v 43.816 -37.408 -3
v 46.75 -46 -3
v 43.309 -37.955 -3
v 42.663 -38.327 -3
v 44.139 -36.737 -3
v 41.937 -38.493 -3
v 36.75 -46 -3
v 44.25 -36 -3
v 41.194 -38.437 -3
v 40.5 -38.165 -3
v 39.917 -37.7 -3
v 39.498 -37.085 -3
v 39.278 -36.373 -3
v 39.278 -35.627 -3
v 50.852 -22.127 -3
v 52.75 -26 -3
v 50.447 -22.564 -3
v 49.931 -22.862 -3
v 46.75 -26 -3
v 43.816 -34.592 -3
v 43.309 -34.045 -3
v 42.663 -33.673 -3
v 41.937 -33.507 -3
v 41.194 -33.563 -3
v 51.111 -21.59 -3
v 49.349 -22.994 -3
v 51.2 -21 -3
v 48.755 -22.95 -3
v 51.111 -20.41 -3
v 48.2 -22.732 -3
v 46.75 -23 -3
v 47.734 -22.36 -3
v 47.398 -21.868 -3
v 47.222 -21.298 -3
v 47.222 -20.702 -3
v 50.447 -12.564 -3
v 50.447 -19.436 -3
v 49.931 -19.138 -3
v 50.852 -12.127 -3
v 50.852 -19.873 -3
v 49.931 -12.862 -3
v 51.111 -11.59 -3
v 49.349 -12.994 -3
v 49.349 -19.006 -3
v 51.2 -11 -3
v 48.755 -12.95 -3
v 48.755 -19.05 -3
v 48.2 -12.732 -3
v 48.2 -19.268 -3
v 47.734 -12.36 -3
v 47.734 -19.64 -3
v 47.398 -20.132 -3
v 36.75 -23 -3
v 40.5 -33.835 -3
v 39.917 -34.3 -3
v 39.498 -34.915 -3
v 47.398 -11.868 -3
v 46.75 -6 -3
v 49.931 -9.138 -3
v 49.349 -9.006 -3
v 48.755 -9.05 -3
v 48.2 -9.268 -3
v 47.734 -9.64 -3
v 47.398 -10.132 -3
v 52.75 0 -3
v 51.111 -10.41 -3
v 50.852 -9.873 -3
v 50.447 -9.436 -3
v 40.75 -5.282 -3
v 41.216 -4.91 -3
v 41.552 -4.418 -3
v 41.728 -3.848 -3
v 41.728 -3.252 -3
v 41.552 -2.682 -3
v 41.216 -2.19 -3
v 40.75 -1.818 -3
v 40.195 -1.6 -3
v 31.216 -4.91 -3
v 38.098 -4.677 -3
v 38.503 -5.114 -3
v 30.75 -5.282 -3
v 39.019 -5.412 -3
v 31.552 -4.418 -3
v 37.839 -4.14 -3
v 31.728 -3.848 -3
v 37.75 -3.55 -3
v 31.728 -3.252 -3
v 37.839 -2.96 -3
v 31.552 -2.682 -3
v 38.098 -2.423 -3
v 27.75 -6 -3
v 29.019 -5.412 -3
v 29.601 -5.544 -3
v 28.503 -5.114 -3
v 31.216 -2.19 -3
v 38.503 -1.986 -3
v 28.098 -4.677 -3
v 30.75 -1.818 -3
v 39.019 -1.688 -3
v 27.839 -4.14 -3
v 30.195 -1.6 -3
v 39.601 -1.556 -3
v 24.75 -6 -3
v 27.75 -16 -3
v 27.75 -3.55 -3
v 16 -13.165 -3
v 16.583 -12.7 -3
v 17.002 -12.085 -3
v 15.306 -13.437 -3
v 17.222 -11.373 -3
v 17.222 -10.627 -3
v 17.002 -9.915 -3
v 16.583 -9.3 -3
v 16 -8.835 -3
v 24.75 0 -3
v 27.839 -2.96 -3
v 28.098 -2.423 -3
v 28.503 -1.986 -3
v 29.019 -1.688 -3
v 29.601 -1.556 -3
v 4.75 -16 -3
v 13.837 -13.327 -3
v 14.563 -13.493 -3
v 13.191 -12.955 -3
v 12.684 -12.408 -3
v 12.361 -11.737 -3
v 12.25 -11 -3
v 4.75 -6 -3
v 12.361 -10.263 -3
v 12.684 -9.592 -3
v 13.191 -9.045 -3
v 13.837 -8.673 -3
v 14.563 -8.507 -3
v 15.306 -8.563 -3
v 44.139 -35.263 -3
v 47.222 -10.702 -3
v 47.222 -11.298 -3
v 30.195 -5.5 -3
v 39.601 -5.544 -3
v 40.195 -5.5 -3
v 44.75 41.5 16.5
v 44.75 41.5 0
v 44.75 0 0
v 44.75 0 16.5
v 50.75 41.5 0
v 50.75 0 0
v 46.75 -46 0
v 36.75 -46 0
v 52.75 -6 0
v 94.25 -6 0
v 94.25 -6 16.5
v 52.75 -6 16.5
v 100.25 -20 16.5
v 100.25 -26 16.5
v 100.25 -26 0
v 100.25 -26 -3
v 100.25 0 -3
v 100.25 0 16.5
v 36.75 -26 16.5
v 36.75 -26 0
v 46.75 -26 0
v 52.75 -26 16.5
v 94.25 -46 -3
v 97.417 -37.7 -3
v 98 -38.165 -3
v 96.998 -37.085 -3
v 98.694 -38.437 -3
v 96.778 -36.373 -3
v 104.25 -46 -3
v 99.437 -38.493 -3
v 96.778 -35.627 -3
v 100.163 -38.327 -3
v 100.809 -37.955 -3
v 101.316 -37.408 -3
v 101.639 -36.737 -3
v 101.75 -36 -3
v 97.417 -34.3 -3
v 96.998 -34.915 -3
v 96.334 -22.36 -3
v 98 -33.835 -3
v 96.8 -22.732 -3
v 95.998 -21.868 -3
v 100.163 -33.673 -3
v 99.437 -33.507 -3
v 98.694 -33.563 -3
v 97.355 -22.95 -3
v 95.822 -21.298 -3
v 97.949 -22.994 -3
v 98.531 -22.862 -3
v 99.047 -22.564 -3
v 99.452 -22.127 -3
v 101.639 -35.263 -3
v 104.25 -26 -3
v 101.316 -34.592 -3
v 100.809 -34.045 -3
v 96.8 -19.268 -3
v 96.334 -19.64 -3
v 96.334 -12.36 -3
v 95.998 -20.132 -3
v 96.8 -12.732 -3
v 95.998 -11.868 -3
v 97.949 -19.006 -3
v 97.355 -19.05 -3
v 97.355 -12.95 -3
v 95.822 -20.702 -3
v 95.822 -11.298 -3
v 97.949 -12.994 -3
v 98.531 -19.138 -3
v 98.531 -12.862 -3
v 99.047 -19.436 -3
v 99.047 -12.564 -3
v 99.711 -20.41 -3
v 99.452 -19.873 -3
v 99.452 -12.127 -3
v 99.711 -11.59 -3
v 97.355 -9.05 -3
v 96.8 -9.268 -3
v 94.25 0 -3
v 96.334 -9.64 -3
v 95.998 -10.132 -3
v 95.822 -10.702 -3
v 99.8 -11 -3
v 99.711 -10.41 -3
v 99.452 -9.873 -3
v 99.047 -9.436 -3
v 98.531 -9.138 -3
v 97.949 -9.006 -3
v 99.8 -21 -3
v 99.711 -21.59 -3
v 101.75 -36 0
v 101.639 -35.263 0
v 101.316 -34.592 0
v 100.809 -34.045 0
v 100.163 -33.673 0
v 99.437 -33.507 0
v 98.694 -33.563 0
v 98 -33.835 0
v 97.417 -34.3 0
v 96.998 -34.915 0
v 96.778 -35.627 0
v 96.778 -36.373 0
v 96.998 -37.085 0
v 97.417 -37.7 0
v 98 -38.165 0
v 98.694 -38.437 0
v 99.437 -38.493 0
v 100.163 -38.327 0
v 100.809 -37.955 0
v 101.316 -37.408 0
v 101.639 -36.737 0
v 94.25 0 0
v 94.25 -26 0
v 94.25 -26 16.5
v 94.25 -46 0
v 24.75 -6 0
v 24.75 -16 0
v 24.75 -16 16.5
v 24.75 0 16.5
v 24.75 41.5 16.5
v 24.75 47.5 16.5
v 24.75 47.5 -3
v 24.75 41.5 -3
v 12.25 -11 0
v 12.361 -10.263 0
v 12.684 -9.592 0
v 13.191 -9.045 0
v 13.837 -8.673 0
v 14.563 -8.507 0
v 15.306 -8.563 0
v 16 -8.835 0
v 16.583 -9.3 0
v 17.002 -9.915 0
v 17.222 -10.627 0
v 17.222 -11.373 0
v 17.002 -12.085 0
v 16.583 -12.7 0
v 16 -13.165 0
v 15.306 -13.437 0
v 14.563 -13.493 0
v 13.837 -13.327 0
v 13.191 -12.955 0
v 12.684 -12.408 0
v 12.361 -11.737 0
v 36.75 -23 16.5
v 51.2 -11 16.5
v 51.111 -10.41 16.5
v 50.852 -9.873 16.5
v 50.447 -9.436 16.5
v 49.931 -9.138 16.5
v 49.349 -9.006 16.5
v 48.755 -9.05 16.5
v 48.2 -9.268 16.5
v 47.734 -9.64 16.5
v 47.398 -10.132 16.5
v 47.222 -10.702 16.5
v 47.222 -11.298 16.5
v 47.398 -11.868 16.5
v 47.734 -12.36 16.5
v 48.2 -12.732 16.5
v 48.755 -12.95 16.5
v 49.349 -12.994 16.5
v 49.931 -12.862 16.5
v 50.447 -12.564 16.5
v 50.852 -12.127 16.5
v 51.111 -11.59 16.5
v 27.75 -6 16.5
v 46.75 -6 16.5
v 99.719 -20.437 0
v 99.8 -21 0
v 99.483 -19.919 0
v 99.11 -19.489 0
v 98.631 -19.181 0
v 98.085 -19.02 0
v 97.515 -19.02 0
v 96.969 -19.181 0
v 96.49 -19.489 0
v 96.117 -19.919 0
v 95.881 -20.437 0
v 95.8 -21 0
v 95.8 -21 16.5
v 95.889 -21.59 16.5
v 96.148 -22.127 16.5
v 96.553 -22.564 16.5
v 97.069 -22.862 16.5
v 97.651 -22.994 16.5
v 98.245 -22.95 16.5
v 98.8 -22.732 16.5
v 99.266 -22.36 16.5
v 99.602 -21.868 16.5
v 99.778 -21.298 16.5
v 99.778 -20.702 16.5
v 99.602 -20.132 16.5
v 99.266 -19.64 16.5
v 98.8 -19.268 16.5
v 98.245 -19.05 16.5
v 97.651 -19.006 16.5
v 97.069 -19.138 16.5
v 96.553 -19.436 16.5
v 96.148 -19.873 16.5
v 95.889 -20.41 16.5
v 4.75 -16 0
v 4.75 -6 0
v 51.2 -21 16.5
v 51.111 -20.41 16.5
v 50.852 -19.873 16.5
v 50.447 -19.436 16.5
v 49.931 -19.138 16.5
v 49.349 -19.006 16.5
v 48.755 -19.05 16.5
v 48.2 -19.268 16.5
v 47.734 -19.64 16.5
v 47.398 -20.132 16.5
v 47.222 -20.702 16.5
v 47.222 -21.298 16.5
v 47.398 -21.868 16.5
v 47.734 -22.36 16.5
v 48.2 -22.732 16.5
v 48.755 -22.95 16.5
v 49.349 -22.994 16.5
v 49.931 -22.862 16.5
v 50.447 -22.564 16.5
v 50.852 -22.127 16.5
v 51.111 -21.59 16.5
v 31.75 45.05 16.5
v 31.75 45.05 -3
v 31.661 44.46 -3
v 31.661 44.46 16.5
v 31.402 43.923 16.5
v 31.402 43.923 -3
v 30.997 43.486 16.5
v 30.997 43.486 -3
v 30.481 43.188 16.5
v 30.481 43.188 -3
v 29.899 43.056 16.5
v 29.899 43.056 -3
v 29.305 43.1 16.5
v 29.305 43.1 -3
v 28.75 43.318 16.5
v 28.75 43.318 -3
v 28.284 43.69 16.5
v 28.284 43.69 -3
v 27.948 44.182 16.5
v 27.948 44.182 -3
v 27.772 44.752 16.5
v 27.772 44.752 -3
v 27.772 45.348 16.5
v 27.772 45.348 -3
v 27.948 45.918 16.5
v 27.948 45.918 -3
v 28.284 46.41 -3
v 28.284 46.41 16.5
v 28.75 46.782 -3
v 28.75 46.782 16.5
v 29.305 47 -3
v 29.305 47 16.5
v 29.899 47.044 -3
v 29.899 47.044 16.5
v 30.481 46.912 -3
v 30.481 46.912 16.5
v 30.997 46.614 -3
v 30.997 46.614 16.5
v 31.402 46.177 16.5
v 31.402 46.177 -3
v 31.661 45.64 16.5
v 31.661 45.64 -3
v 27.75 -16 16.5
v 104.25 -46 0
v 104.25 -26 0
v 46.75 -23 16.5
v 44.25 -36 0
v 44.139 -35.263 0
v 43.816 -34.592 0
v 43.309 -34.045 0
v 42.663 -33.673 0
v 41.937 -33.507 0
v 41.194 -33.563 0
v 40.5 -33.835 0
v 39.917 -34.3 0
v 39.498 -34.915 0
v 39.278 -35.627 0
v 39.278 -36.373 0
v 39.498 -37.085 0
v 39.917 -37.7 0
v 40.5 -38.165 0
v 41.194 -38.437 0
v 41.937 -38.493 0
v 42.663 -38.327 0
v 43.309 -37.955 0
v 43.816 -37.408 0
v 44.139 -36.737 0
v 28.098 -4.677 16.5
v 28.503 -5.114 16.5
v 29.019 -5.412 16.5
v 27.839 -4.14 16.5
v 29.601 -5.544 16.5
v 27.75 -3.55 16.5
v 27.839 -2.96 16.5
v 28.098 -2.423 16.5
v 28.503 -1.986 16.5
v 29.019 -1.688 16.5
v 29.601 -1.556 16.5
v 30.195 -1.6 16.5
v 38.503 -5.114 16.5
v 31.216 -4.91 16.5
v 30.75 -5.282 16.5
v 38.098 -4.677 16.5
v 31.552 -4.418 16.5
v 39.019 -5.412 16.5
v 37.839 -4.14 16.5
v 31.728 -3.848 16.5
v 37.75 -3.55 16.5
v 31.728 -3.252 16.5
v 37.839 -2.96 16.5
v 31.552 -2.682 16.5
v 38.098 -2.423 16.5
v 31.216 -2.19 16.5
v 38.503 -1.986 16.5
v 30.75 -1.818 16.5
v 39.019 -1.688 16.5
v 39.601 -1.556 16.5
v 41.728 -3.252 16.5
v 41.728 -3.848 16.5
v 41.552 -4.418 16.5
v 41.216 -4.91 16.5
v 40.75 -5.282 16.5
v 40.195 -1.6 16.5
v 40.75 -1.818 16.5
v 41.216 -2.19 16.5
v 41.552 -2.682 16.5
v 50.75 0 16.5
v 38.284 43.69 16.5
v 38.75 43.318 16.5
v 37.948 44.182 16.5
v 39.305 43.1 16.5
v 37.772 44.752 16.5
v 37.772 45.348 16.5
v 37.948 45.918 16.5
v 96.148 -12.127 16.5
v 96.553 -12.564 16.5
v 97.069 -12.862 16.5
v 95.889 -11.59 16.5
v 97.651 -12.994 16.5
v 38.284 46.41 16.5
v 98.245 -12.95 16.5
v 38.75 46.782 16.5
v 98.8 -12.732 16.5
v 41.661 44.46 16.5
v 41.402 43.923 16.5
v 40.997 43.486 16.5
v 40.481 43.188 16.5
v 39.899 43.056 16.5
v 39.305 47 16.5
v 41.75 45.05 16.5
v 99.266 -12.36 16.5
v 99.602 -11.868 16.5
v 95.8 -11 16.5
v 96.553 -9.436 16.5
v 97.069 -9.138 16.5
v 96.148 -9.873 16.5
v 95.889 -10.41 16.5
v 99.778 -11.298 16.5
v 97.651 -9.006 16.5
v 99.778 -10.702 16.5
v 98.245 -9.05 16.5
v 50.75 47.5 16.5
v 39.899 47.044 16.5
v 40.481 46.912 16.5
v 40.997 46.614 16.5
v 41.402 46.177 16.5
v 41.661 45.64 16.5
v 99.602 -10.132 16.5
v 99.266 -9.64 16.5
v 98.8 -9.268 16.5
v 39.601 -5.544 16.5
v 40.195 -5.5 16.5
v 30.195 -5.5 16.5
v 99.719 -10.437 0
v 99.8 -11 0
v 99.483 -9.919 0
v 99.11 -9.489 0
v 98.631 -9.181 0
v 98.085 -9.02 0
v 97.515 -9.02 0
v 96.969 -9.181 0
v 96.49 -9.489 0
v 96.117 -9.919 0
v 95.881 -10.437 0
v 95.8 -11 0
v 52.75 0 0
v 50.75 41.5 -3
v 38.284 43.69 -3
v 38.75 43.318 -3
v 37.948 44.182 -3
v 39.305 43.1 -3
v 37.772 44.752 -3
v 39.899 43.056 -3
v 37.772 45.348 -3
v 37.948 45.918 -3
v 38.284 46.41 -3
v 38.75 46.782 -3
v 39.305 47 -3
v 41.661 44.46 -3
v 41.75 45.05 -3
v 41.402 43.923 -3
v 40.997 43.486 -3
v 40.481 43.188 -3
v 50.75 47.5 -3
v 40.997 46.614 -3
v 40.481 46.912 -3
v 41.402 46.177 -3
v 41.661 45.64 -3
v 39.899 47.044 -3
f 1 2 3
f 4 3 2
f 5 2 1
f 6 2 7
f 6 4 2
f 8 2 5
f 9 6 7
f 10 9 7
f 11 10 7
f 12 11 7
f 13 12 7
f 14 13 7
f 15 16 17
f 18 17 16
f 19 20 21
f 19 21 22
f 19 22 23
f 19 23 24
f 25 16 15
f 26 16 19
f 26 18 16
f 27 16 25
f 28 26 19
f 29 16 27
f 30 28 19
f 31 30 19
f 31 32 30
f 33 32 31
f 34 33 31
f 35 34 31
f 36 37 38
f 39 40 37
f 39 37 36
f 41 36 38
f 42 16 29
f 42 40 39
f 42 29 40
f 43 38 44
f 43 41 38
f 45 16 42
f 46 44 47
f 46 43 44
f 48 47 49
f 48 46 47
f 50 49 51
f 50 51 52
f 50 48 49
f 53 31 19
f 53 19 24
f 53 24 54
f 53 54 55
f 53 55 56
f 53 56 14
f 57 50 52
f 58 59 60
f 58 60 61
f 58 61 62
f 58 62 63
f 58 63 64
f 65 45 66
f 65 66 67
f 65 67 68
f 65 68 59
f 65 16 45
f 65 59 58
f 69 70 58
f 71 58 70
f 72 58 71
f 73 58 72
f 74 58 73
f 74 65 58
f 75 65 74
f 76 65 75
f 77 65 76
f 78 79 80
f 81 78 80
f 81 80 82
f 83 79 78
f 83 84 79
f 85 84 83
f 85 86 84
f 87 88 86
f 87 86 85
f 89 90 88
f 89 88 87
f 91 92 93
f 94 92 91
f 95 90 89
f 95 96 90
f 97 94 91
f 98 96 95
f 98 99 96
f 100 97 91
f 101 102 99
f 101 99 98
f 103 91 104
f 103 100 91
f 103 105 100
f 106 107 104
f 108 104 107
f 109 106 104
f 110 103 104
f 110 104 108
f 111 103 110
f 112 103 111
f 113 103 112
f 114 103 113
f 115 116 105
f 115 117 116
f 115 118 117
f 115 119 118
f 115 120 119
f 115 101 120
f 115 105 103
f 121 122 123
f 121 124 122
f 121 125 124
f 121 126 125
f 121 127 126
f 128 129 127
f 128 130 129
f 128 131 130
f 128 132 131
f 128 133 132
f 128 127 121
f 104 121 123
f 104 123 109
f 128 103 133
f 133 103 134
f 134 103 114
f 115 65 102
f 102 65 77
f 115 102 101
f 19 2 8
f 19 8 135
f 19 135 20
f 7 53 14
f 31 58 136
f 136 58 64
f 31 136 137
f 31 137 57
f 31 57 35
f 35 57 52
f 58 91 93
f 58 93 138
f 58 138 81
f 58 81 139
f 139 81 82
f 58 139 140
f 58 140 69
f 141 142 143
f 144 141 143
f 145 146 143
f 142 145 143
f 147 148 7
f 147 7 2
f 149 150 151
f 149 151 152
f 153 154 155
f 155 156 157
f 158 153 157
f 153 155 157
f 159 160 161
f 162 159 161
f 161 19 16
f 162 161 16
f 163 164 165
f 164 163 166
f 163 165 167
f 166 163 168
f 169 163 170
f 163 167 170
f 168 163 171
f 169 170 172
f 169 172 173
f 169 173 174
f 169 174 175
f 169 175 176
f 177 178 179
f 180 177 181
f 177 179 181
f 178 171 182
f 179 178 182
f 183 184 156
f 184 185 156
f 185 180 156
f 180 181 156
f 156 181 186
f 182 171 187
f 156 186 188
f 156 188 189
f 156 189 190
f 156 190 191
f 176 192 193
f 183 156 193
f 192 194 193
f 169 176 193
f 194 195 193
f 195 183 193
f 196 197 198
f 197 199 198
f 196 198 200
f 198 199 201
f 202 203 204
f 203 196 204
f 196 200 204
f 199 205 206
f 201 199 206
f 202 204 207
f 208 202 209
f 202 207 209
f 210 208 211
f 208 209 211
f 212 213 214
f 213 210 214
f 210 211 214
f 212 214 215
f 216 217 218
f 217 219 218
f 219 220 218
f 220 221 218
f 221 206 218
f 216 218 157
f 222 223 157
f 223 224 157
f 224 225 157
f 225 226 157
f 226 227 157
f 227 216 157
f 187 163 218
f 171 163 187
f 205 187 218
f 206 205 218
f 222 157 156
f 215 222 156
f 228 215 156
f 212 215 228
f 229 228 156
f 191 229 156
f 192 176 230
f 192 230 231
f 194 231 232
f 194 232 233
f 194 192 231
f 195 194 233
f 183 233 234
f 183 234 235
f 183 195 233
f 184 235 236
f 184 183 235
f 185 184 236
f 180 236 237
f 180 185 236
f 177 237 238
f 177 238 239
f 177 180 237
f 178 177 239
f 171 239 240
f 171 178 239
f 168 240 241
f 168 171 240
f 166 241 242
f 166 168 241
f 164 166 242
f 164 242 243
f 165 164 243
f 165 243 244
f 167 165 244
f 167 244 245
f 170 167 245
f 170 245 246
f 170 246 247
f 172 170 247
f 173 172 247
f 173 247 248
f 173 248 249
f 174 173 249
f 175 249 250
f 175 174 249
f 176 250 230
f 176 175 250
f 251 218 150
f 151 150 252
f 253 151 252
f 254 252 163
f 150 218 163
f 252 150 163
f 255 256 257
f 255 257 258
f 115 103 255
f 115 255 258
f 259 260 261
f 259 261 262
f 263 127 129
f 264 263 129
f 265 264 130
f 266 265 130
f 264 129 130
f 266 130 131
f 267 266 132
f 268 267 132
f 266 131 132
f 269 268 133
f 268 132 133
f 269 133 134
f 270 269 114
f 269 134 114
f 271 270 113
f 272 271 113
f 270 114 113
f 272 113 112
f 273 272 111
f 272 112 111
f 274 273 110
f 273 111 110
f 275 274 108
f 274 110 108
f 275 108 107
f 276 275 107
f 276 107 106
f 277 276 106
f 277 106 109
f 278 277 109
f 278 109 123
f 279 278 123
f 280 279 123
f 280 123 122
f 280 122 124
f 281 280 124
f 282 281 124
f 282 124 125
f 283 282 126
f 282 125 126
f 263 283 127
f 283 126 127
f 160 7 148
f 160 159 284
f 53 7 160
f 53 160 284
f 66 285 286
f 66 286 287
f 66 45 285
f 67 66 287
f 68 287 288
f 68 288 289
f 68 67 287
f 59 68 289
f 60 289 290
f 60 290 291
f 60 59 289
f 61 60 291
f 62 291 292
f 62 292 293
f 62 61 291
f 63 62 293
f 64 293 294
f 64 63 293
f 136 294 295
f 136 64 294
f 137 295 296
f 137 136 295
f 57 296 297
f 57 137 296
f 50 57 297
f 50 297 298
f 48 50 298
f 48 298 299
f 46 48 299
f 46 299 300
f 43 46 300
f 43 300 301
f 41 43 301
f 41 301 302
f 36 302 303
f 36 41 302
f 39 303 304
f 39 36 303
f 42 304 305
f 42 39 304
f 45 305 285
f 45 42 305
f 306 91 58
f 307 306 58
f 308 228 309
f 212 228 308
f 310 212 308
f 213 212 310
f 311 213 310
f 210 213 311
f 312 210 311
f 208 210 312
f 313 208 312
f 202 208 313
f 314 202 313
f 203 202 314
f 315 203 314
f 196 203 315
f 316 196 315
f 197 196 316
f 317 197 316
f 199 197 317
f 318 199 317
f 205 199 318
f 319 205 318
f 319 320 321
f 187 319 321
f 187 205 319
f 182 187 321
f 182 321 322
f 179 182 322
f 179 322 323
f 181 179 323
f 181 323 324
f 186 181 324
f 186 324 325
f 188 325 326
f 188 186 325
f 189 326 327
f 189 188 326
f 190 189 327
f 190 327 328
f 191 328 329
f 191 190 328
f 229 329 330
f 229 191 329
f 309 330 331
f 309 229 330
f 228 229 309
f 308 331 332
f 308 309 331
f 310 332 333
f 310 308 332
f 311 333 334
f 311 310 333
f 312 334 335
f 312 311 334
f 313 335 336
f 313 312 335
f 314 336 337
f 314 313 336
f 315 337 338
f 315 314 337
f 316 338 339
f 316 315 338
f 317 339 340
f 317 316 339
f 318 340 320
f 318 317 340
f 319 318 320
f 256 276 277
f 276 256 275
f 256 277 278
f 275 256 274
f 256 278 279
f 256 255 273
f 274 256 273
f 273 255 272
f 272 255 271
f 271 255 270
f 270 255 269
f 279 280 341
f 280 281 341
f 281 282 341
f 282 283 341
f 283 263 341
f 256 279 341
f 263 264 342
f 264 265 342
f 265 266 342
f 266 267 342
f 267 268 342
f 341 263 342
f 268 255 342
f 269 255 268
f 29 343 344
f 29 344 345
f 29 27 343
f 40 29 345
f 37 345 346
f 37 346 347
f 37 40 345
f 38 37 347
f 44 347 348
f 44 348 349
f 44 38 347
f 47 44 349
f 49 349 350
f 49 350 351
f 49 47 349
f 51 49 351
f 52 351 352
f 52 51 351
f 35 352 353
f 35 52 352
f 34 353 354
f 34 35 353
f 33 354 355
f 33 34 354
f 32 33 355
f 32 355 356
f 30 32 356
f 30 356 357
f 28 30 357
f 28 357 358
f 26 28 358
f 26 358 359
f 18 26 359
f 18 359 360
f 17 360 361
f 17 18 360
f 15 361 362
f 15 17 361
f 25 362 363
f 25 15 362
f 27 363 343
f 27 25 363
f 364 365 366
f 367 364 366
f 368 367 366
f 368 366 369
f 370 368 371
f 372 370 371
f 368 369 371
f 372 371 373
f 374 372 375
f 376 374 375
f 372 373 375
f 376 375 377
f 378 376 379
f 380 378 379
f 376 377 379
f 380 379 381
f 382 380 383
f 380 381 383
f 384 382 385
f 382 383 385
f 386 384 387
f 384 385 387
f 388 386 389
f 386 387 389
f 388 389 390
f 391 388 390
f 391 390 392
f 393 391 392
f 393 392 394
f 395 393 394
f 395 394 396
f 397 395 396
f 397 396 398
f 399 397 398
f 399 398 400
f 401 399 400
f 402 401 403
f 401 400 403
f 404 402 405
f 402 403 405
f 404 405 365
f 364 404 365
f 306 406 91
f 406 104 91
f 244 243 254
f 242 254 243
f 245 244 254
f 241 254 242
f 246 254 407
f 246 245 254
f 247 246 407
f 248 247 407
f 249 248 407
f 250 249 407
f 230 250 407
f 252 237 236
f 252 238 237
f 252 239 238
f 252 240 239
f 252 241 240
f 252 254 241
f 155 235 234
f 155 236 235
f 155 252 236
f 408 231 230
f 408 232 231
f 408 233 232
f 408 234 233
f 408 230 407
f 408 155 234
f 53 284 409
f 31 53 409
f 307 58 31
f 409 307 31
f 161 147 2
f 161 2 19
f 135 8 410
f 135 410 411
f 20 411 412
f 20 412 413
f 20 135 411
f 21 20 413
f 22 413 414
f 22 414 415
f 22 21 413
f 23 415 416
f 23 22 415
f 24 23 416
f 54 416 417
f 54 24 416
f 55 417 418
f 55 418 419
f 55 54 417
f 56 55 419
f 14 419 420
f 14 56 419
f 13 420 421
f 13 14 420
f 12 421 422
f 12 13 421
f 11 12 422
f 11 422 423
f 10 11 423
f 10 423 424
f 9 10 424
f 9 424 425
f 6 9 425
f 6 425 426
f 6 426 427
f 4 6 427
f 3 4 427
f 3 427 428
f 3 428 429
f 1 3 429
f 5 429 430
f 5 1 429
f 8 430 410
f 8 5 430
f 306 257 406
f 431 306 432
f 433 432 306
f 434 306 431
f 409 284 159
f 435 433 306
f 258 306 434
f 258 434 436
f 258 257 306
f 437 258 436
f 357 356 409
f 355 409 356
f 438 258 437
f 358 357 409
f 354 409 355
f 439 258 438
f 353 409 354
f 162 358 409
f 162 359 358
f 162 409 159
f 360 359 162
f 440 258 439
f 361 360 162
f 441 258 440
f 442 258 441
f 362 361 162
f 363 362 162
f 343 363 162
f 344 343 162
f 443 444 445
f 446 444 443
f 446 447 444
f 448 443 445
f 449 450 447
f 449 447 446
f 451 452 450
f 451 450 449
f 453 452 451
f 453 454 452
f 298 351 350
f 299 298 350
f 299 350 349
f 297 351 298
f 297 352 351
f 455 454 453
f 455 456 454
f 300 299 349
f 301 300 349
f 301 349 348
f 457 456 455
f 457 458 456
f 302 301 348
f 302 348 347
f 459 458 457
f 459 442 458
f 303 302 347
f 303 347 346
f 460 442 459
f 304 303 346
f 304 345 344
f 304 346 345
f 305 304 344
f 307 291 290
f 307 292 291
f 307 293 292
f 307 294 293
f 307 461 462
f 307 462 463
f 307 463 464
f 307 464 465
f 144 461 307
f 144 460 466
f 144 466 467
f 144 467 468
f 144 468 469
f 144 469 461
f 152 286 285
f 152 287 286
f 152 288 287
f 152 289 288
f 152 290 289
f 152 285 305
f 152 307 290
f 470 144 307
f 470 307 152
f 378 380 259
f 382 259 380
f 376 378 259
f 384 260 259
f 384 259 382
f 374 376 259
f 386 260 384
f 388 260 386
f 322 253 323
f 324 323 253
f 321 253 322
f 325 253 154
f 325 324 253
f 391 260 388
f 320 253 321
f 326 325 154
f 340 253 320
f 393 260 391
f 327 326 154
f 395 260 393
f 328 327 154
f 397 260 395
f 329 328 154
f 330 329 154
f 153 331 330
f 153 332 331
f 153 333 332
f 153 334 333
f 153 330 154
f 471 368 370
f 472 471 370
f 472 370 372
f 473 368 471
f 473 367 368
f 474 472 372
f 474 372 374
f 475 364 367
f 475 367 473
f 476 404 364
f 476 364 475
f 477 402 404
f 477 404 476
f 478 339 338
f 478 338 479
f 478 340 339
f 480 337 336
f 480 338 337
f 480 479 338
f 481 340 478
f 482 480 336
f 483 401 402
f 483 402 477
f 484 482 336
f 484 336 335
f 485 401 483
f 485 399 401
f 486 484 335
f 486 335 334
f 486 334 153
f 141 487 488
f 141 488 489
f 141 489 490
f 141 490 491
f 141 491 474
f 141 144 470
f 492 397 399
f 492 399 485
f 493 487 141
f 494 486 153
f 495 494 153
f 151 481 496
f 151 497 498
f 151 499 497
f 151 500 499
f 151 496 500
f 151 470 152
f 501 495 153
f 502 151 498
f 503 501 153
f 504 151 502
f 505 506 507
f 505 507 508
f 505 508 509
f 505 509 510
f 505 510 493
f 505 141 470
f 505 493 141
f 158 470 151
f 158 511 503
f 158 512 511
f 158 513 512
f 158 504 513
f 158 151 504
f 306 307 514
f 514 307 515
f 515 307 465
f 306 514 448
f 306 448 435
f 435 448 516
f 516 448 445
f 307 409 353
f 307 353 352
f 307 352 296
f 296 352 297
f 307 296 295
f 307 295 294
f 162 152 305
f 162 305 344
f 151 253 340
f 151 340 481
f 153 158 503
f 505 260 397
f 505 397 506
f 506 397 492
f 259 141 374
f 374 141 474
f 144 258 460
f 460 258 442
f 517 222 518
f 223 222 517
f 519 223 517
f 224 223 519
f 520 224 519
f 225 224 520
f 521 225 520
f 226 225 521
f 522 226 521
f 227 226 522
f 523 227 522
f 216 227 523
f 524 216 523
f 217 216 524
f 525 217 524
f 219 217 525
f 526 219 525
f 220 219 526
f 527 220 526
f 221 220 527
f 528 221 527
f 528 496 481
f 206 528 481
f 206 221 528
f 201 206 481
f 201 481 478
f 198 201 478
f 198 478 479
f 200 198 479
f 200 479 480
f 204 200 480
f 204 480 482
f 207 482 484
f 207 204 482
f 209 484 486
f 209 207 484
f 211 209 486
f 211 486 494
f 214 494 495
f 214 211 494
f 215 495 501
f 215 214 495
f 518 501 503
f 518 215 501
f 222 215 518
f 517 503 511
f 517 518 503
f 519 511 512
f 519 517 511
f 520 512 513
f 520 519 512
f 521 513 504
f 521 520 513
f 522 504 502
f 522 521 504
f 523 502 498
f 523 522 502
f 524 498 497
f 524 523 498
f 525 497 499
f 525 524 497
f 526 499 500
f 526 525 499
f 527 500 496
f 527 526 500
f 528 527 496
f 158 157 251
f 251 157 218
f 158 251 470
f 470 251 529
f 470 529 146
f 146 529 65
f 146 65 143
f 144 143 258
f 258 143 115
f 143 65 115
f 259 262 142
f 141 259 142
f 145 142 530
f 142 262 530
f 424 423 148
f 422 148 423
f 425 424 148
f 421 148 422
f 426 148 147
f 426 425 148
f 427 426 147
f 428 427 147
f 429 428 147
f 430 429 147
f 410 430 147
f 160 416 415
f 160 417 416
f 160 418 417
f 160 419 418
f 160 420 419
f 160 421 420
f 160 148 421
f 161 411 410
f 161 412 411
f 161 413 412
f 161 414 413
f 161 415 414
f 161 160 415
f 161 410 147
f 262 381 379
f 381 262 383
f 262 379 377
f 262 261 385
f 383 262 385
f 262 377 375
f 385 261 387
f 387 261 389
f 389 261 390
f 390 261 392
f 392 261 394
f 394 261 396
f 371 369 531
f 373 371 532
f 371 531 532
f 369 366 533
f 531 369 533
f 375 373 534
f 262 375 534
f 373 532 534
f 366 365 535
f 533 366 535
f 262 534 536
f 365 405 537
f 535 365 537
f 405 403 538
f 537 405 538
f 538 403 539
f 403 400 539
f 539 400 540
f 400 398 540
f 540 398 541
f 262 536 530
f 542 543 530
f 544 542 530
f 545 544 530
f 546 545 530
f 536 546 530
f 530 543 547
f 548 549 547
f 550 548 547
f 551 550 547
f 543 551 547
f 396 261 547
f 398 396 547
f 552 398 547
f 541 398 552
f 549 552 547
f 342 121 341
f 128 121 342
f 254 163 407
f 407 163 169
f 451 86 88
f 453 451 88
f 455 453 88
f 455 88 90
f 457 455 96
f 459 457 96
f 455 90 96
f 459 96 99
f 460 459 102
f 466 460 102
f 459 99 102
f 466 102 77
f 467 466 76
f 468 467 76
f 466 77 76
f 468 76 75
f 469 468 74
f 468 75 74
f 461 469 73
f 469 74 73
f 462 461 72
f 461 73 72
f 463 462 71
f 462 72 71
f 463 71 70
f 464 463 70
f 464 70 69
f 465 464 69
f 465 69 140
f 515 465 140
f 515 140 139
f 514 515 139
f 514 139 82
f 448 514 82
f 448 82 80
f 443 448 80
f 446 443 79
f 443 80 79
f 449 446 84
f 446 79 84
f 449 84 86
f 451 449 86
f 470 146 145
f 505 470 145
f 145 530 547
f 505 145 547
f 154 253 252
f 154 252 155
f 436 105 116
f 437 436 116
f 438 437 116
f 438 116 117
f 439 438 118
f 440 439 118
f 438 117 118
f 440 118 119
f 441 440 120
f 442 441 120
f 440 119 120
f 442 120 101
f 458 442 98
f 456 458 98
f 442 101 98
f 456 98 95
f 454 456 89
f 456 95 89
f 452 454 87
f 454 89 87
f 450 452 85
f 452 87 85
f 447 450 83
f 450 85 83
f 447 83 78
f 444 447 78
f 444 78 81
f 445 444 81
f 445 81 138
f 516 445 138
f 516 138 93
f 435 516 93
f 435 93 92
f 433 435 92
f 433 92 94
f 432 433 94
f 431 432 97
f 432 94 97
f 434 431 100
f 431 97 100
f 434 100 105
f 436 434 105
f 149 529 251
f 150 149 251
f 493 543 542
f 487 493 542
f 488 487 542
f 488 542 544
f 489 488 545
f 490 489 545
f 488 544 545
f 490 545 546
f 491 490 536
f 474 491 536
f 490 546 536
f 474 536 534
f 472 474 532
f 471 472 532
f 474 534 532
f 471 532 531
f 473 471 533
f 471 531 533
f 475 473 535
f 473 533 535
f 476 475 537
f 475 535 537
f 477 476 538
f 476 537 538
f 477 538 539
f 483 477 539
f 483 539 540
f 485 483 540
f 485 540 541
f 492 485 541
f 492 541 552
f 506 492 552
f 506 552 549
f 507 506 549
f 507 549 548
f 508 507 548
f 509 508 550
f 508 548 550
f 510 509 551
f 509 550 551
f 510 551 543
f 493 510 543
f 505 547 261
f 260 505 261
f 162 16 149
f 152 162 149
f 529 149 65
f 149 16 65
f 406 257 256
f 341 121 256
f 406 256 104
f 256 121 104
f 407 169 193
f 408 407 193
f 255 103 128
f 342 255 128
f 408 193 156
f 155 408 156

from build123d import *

# Parameters (mm, degrees)
EXTRUDE_1_DEPTH     = 16.5
SKETCH_3_W          = 10
SKETCH_3_H          = 16.5
CUT_EXTRUDE_2_DEPTH = 3
SKETCH_4_W          = 11.896315449
SKETCH_4_H          = 29.084641161
CUT_EXTRUDE_3_DEPTH = 48.945933091
SKETCH_5_R          = 2
CUT_EXTRUDE_4_DEPTH = 48.945933091
SKETCH_6_W          = 10
SKETCH_6_H          = 23
EXTRUDE_2_DEPTH     = 3
SKETCH_7_R          = 2.5
CUT_EXTRUDE_5_DEPTH = 3
EXTRUDE_START       = 3
SKETCH_8_R          = 2
SKETCH_8_W          = 6
SKETCH_8_H          = 26
EXTRUDE_3_DEPTH     = 3
SKETCH_9_R          = 2.5
CUT_EXTRUDE_6_DEPTH = 3
SKETCH_10_W         = 74.694005649
SKETCH_10_H         = 52.095093629
CUT_EXTRUDE_7_DEPTH = 116.604119736
SKETCH_13_R         = 2
EXTRUDE_4_DEPTH     = 19.5
SKETCH_14_W         = 6
SKETCH_14_H         = 41.5
CUT_EXTRUDE_9_DEPTH = 3
SKETCH_15_W         = 23
SKETCH_15_H         = 10
SKETCH_15_R         = 2.5
EXTRUDE_5_DEPTH     = 3
SKETCH_16_W         = 3
SKETCH_16_H         = 10
EXTRUDE_6_DEPTH     = 16.5


with BuildPart() as part:
    # 草图1 → 凸台-拉伸1 (new body)
    with BuildSketch(Plane.XY):
        Polygon((0, 0), (26.75, 0), (26.75, -20), (36.75, -20), (36.75, -26), (20.75, -26), (20.75, -6), (0, -6), (-20.75, -6), (-20.75, -26), (-36.75, -26), (-36.75, -20), (-26.75, -20), (-26.75, 0), align=None)
    extrude(amount=EXTRUDE_1_DEPTH)

    # 草图3 → 切除-拉伸2 (cut)
    with BuildSketch(Plane(origin=(0, -20, 0), x_dir=(1, 0, 0), z_dir=(0, 1, 0))):
        with Locations((31.75, -8.25)):
            Rectangle(SKETCH_3_W, SKETCH_3_H)
    extrude(amount=-CUT_EXTRUDE_2_DEPTH, mode=Mode.SUBTRACT)

    # 草图4 → 切除-拉伸3 (cut, through all)
    with BuildSketch(Plane.XY.offset(16.5)):
        with Locations((-32.698157724, -14.542320581)):
            Rectangle(SKETCH_4_W, SKETCH_4_H)
    extrude(amount=-CUT_EXTRUDE_3_DEPTH, mode=Mode.SUBTRACT)

    # 草图5 → 切除-拉伸4 (cut, through all)
    with BuildSketch(Plane(origin=(0, 0, 0), x_dir=(-1, 0, 0), z_dir=(0, 0, -1))):
        with Locations((-24.3, -11)):
            Circle(SKETCH_5_R)
        with Locations((-24.3, -21)):
            Circle(SKETCH_5_R)
        with Locations(Location((24.3, -21, 0), (0, 0, 180))):
            Circle(SKETCH_5_R)
        with Locations(Location((24.3, -11, 0), (0, 0, 180))):
            Circle(SKETCH_5_R)
    extrude(amount=-CUT_EXTRUDE_4_DEPTH, mode=Mode.SUBTRACT)

    # 草图6 → 凸台-拉伸2 (add)
    with BuildSketch(Plane(origin=(0, 0, 0), x_dir=(-1, 0, 0), z_dir=(0, 0, -1))):
        with Locations((-31.75, -34.5)):
            Rectangle(SKETCH_6_W, SKETCH_6_H)
    extrude(amount=EXTRUDE_2_DEPTH)

    # 草图7 → 切除-拉伸5 (cut)
    with BuildSketch(Plane(origin=(0, 0, -3), x_dir=(-1, 0, 0), z_dir=(0, 0, -1))):
        with Locations((-31.75, -36)):
            Circle(SKETCH_7_R)
    extrude(amount=-CUT_EXTRUDE_5_DEPTH, mode=Mode.SUBTRACT)

    # 草图8 → 凸台-拉伸3 (add)
    # profile 1 of 2: a face of its own
    with BuildSketch(Plane(origin=(0, 0, 0), x_dir=(-1, 0, 0), z_dir=(0, 0, -1)).offset(EXTRUDE_START)):
        Polygon((26.75, 0), (20.75, 0), (20.75, -46), (26.75, -46), (30.75, -46), (30.75, -26), (26.75, -26), align=None)
        with Locations((24.3, -21)):
            Circle(SKETCH_8_R, mode=Mode.SUBTRACT)
        with Locations((24.3, -11)):
            Circle(SKETCH_8_R, mode=Mode.SUBTRACT)
    # profile 2 of 2: a face of its own
    with BuildSketch(Plane(origin=(0, 0, 0), x_dir=(-1, 0, 0), z_dir=(0, 0, -1)).offset(EXTRUDE_START)):
        with Locations((-23.75, -13)):
            Rectangle(SKETCH_8_W, SKETCH_8_H)
        with Locations((-24.3, -11)):
            Circle(SKETCH_8_R, mode=Mode.SUBTRACT)
        with Locations((-24.3, -21)):
            Circle(SKETCH_8_R, mode=Mode.SUBTRACT)
    extrude(amount=-EXTRUDE_3_DEPTH)

    # 草图9 → 切除-拉伸6 (cut)
    with BuildSketch(Plane(origin=(0, 0, -3), x_dir=(-1, 0, 0), z_dir=(0, 0, -1))):
        with Locations((25.75, -36)):
            Circle(SKETCH_9_R)
    extrude(amount=-CUT_EXTRUDE_6_DEPTH, mode=Mode.SUBTRACT)

    # 镜向1: part across plane


with BuildPart() as part_1:
    add(part.part)
    add(part.part.mirror(Plane(origin=(36.75, -20, 16.5), x_dir=(0, 0, 1), z_dir=(-1, 0, 0))))

    # 草图10 → 切除-拉伸7 (cut, through all)
    with BuildSketch(Plane(origin=(0, 0, -3), x_dir=(-1, 0, 0), z_dir=(0, 0, -1))):
        with Locations((0.597002825, -19.952453186)):
            Rectangle(SKETCH_10_W, SKETCH_10_H)
    extrude(amount=-CUT_EXTRUDE_7_DEPTH, mode=Mode.SUBTRACT)

    # 草图13 → 凸台-拉伸4 (add)
    with BuildSketch(Plane(origin=(0, 0, -3), x_dir=(-1, 0, 0), z_dir=(0, 0, -1))):
        Polygon((-24.75, -6), (-50.75, -6), (-50.75, 47.5), (-24.75, 47.5), (-24.75, 41.5), (-44.75, 41.5), (-44.75, 0), (-24.75, 0), align=None)
        with Locations((-29.75, -3.55)):
            Circle(SKETCH_13_R, mode=Mode.SUBTRACT)
        with Locations((-39.75, -3.55)):
            Circle(SKETCH_13_R, mode=Mode.SUBTRACT)
        with Locations(Location((-39.75, 45.05, 0), (0, 0, 180))):
            Circle(SKETCH_13_R, mode=Mode.SUBTRACT)
        with Locations(Location((-29.75, 45.05, 0), (0, 0, 180))):
            Circle(SKETCH_13_R, mode=Mode.SUBTRACT)
    extrude(amount=-EXTRUDE_4_DEPTH)

    # 草图14 → 切除-拉伸9 (cut)
    with BuildSketch(Plane(origin=(0, 0, -3), x_dir=(-1, 0, 0), z_dir=(0, 0, -1))):
        with Locations((-47.75, 20.75)):
            Rectangle(SKETCH_14_W, SKETCH_14_H)
    extrude(amount=-CUT_EXTRUDE_9_DEPTH, mode=Mode.SUBTRACT)

    # 草图15 → 凸台-拉伸5 (add)
    with BuildSketch(Plane(origin=(0, 0, -3), x_dir=(-1, 0, 0), z_dir=(0, 0, -1))):
        with Locations((-16.25, -11)):
            Rectangle(SKETCH_15_W, SKETCH_15_H)
        with Locations((-14.75, -11)):
            Circle(SKETCH_15_R, mode=Mode.SUBTRACT)
    extrude(amount=-EXTRUDE_5_DEPTH)

    # 草图16 → 凸台-拉伸6 (add)
    with BuildSketch(Plane.XY):
        with Locations((26.25, -11)):
            Rectangle(SKETCH_16_W, SKETCH_16_H)
    extrude(amount=EXTRUDE_6_DEPTH)


solid = part_1.part
